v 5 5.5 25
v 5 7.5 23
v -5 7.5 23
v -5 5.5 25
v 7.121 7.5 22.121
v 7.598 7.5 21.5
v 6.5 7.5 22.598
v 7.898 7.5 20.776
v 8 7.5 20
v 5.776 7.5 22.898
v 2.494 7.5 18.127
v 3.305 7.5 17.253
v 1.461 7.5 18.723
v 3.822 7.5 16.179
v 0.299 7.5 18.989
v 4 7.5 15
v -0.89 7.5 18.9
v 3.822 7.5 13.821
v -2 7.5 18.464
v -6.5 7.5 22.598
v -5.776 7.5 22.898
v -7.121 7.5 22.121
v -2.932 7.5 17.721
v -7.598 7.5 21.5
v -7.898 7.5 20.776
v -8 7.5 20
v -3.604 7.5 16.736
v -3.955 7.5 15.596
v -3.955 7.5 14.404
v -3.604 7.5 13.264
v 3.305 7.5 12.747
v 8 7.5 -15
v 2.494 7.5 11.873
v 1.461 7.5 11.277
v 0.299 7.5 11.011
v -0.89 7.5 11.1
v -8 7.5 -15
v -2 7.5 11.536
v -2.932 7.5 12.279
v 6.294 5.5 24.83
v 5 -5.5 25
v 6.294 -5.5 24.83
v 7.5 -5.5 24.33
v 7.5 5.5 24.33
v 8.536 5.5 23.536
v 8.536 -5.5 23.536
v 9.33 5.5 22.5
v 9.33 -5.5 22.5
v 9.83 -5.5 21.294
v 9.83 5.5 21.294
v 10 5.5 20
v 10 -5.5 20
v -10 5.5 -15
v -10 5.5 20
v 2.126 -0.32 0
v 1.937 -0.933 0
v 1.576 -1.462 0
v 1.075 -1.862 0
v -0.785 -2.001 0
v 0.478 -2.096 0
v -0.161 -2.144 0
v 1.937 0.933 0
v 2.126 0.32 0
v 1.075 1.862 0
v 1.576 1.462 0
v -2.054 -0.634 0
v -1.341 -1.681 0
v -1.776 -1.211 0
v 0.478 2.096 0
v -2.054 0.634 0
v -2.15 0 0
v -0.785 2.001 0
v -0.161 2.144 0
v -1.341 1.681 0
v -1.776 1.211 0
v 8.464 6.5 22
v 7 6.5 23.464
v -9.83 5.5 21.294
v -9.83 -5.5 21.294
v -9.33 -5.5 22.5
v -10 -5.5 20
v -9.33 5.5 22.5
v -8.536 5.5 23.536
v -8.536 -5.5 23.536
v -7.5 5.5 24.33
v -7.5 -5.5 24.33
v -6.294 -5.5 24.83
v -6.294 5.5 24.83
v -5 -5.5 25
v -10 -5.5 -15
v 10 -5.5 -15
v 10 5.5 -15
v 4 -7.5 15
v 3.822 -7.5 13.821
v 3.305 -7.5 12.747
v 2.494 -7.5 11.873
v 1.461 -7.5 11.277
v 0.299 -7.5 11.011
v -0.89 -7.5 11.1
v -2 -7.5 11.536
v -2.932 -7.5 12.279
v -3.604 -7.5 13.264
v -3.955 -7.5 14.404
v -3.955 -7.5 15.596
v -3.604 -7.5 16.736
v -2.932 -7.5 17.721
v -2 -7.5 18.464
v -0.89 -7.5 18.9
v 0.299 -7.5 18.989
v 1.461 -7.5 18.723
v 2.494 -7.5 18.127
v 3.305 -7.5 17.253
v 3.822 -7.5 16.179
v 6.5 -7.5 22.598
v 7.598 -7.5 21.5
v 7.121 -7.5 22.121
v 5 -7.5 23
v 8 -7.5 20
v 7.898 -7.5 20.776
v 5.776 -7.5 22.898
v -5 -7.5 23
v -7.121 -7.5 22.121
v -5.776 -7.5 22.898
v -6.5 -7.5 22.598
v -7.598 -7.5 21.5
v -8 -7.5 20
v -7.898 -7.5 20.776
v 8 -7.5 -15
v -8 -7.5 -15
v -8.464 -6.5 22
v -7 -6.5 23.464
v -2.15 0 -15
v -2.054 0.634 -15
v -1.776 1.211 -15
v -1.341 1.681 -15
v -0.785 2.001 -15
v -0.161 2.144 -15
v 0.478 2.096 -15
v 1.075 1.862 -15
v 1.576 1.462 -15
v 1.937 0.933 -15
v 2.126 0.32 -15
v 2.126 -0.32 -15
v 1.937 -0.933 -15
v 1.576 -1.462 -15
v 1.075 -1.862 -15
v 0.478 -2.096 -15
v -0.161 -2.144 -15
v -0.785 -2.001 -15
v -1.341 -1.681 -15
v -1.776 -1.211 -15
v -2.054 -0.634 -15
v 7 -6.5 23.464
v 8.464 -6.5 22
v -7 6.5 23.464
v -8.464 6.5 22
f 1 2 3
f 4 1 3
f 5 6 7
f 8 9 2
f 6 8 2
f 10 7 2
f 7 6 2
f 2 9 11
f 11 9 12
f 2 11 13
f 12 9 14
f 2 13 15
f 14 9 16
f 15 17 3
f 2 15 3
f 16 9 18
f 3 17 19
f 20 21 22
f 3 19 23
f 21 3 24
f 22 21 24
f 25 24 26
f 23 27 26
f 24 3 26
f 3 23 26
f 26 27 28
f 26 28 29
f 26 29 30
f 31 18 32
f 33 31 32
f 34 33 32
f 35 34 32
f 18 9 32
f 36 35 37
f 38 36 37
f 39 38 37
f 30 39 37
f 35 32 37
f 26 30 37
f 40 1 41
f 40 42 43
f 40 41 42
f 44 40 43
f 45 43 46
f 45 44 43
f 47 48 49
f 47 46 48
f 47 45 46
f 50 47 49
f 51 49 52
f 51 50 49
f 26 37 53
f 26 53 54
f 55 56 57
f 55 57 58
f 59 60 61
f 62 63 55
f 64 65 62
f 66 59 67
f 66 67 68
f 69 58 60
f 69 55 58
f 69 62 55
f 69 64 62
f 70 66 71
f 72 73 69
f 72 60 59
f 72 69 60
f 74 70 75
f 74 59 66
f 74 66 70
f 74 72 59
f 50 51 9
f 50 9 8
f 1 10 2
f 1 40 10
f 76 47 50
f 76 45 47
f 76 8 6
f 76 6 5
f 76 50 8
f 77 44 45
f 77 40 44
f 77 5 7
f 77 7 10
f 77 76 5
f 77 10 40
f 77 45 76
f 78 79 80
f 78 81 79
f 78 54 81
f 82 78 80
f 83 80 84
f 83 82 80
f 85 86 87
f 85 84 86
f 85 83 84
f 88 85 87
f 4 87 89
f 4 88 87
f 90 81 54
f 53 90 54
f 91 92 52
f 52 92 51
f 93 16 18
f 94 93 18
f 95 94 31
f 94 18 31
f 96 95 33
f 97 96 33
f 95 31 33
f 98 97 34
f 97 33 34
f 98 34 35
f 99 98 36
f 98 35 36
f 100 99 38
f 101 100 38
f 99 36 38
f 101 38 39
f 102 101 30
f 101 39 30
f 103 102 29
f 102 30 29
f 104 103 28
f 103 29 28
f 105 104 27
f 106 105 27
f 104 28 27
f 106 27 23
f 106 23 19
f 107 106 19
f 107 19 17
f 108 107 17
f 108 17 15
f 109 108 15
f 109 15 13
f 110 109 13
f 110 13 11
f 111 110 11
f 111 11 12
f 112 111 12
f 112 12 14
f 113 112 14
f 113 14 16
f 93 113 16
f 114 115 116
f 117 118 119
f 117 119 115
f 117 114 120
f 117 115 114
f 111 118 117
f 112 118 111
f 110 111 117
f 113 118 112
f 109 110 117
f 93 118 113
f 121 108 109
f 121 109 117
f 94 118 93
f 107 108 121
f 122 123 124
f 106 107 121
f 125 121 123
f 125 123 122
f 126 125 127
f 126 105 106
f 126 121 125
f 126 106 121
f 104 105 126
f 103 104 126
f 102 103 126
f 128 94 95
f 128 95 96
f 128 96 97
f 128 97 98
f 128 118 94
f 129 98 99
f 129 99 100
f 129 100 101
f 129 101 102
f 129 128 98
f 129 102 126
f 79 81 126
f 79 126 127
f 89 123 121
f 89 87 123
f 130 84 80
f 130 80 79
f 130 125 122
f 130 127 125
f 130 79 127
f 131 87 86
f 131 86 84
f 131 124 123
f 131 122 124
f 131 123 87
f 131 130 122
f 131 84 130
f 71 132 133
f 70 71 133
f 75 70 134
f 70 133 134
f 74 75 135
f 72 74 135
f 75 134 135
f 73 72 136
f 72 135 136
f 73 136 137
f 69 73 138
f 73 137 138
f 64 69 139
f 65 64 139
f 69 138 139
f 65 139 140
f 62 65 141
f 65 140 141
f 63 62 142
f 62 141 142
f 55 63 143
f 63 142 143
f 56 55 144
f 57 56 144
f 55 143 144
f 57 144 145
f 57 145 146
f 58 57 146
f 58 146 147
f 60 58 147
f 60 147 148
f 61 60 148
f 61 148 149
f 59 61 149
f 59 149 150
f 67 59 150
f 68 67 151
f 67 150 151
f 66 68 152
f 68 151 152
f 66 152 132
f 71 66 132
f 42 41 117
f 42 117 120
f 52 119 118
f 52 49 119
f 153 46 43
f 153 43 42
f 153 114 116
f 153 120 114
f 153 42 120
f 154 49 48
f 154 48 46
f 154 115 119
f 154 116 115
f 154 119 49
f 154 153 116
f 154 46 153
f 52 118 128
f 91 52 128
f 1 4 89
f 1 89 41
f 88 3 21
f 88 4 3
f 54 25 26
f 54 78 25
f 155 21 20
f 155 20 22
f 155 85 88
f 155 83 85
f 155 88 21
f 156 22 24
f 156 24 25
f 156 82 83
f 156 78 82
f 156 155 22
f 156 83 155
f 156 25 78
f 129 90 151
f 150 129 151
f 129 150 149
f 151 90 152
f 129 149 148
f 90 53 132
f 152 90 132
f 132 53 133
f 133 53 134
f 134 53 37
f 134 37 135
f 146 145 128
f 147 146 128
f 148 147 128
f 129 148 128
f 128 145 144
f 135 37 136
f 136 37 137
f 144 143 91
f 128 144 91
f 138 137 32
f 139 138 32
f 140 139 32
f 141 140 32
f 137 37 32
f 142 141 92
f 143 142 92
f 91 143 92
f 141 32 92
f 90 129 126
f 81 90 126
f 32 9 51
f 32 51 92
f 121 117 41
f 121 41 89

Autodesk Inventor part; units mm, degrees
ref_plane "YZ Plane" through (0, 0, 0) normal (1, 0, 0) x (0, 1, 0)
ref_plane "XZ Plane" through (0, 0, 0) normal (0, 1, 0) x (-1, 0, 0)
ref_plane "XY Plane" through (0, 0, 0) normal (0, 0, 1) x (1, 0, 0)
sketch "Sketch1" plane through (0, 0, 0) normal (0, 0, 1) x (1, 0, 0)
  line L0 (10, -7.5) -> (-10, -7.5)
  line L1 (-10, -7.5) -> (-10, 7.5)
  line L2 (-10, 7.5) -> (10, 7.5)
  line L3 (10, 7.5) -> (10, -7.5)
  line L4 (10, -7.5) -> (-10, 7.5) construction
  line L5 (-10, -7.5) -> (10, 7.5) construction
  line L6 (-10, 7.5) -> (10, 7.5)
  line L7 (10, 7.5) -> (10, 13.5)
  line L8 (10, 13.5) -> (-10, 13.5)
  line L9 (-10, 13.5) -> (-10, 7.5)
  line L10 (-10, -7.5) -> (10, -7.5)
  line L11 (10, -7.5) -> (10, -13.5)
  line L12 (10, -13.5) -> (-10, -13.5)
  line L13 (-10, -13.5) -> (-10, -7.5)
  point P0 (0, 0)
  dimension "d0" = 15
  dimension "d1" = 20
  dimension "d2" = 6
extrude "Extrusion1" add sketch "Sketch1" against normal blind 15
extrude "Extrusion2" add sketch "Sketch1" along normal blind 25 contours L11 L12 L13 L0 | L2 L9 L8 L7
sketch "Sketch2" plane through (-10, 13.5, -15) normal (0, 1, 0) x (1, 0, 0)
  line L0 (20, -15) -> (0, -15) projected
  line L1 (20, -40) -> (0, -40) construction
  line L2 (10, -40) -> (10, -30) construction
  circle A0 centre (10, -30) radius 4
  point P0 (10, -15)
  dimension "d7" = 8
  dimension "d8" = 10
extrude "Extrusion3" cut sketch "Sketch2" against normal through all
fillet "Fillet1" radius 5 4 edges at (-10, 10.5, 25) (10, 10.5, 25) (-10, -10.5, 25) (10, -10.5, 25)
sketch "Sketch3" plane through (0, 0, -15) normal (0, 0, -1) x (-1, 0, 0)
  circle A0 centre (0, 0) radius 2.15
  dimension "d12" = 4.3
extrude "Extrusion4" cut sketch "Sketch3" against normal through all
chamfer "Chamfer1" distance 2 angle 45 6 edges at (8.5355, 13.5, 23.5355) (0, 13.5, 25) (-8.5355, 13.5, 23.5355) (8.5355, -13.5, 23.5355) (0, -13.5, 25) (-8.5355, -13.5, 23.5355)
chamfer "Chamfer2" distance 4 angle 45 1 edges at (-10, 0, 0)
sketch "Sketch4" plane through (-5, 7.5, 25) normal (0, -1, 0) x (1, 0, 0)
  circle A0 centre (5, -10) radius 4 projected
  arc A1 (15, -5) -> (10, 0) centre (10, -5) ccw projected
  line L0 (0, 0) -> (10, 0) projected
  arc A2 (0, 0) -> (-5, -5) centre (0, -5) ccw projected
  line L1 (-5, -29) -> (-5, -5) projected
  line L2 (-1, -25) -> (-5, -29) projected
  line L3 (15, -25) -> (-1, -25) projected
  line L4 (15, -25) -> (15, -5) projected
  point P0 (5, -25)
extrude "Extrusion5" add sketch "Sketch4" along normal up to next
sketch "Sketch5" plane through (0, 0, -15) normal (0, 0, -1) x (-1, 0, 0)
  line L0 (10, -11.5) -> (8, -13.5) projected
  line L1 (10, -11.5) -> (10, 11.5) projected
  line L2 (8, 13.5) -> (10, 11.5) projected
  line L3 (8, 13.5) -> (-8, 13.5) projected
  line L4 (-10, 11.5) -> (-8, 13.5) projected
  line L5 (-10, 11.5) -> (-10, -11.5) projected
  line L6 (-8, -13.5) -> (-10, -11.5) projected
  line L7 (-8, -13.5) -> (8, -13.5) projected
  circle A0 centre (0, 0) radius 2.15 projected
  line L8 (-10, -11.5) -> (-10, 11.5) projected
  line L9 (-10, -7.5) -> (10, -7.5)
  line L10 (-10, 7.5) -> (10, 7.5)
  dimension "d23" = 6
  dimension "d24" = 6
extrude "Extrusion6" cut sketch "Sketch5" against normal through all contours L0 L7 L6 L5 L9 L1 | L10 L5 L4 L3 L2 L1
chamfer "Chamfer3" distance 2 angle 45 8 edges at (10, -7.5, 2.5) (0, -7.5, 25) (-10, -7.5, 2.5) (10, 7.5, 2.5) (8.5355, 7.5, 23.5355) (0, 7.5, 25) (-8.5355, 7.5, 23.5355) (-10, 7.5, 2.5)
properties part number "cylinder clevis 2"
